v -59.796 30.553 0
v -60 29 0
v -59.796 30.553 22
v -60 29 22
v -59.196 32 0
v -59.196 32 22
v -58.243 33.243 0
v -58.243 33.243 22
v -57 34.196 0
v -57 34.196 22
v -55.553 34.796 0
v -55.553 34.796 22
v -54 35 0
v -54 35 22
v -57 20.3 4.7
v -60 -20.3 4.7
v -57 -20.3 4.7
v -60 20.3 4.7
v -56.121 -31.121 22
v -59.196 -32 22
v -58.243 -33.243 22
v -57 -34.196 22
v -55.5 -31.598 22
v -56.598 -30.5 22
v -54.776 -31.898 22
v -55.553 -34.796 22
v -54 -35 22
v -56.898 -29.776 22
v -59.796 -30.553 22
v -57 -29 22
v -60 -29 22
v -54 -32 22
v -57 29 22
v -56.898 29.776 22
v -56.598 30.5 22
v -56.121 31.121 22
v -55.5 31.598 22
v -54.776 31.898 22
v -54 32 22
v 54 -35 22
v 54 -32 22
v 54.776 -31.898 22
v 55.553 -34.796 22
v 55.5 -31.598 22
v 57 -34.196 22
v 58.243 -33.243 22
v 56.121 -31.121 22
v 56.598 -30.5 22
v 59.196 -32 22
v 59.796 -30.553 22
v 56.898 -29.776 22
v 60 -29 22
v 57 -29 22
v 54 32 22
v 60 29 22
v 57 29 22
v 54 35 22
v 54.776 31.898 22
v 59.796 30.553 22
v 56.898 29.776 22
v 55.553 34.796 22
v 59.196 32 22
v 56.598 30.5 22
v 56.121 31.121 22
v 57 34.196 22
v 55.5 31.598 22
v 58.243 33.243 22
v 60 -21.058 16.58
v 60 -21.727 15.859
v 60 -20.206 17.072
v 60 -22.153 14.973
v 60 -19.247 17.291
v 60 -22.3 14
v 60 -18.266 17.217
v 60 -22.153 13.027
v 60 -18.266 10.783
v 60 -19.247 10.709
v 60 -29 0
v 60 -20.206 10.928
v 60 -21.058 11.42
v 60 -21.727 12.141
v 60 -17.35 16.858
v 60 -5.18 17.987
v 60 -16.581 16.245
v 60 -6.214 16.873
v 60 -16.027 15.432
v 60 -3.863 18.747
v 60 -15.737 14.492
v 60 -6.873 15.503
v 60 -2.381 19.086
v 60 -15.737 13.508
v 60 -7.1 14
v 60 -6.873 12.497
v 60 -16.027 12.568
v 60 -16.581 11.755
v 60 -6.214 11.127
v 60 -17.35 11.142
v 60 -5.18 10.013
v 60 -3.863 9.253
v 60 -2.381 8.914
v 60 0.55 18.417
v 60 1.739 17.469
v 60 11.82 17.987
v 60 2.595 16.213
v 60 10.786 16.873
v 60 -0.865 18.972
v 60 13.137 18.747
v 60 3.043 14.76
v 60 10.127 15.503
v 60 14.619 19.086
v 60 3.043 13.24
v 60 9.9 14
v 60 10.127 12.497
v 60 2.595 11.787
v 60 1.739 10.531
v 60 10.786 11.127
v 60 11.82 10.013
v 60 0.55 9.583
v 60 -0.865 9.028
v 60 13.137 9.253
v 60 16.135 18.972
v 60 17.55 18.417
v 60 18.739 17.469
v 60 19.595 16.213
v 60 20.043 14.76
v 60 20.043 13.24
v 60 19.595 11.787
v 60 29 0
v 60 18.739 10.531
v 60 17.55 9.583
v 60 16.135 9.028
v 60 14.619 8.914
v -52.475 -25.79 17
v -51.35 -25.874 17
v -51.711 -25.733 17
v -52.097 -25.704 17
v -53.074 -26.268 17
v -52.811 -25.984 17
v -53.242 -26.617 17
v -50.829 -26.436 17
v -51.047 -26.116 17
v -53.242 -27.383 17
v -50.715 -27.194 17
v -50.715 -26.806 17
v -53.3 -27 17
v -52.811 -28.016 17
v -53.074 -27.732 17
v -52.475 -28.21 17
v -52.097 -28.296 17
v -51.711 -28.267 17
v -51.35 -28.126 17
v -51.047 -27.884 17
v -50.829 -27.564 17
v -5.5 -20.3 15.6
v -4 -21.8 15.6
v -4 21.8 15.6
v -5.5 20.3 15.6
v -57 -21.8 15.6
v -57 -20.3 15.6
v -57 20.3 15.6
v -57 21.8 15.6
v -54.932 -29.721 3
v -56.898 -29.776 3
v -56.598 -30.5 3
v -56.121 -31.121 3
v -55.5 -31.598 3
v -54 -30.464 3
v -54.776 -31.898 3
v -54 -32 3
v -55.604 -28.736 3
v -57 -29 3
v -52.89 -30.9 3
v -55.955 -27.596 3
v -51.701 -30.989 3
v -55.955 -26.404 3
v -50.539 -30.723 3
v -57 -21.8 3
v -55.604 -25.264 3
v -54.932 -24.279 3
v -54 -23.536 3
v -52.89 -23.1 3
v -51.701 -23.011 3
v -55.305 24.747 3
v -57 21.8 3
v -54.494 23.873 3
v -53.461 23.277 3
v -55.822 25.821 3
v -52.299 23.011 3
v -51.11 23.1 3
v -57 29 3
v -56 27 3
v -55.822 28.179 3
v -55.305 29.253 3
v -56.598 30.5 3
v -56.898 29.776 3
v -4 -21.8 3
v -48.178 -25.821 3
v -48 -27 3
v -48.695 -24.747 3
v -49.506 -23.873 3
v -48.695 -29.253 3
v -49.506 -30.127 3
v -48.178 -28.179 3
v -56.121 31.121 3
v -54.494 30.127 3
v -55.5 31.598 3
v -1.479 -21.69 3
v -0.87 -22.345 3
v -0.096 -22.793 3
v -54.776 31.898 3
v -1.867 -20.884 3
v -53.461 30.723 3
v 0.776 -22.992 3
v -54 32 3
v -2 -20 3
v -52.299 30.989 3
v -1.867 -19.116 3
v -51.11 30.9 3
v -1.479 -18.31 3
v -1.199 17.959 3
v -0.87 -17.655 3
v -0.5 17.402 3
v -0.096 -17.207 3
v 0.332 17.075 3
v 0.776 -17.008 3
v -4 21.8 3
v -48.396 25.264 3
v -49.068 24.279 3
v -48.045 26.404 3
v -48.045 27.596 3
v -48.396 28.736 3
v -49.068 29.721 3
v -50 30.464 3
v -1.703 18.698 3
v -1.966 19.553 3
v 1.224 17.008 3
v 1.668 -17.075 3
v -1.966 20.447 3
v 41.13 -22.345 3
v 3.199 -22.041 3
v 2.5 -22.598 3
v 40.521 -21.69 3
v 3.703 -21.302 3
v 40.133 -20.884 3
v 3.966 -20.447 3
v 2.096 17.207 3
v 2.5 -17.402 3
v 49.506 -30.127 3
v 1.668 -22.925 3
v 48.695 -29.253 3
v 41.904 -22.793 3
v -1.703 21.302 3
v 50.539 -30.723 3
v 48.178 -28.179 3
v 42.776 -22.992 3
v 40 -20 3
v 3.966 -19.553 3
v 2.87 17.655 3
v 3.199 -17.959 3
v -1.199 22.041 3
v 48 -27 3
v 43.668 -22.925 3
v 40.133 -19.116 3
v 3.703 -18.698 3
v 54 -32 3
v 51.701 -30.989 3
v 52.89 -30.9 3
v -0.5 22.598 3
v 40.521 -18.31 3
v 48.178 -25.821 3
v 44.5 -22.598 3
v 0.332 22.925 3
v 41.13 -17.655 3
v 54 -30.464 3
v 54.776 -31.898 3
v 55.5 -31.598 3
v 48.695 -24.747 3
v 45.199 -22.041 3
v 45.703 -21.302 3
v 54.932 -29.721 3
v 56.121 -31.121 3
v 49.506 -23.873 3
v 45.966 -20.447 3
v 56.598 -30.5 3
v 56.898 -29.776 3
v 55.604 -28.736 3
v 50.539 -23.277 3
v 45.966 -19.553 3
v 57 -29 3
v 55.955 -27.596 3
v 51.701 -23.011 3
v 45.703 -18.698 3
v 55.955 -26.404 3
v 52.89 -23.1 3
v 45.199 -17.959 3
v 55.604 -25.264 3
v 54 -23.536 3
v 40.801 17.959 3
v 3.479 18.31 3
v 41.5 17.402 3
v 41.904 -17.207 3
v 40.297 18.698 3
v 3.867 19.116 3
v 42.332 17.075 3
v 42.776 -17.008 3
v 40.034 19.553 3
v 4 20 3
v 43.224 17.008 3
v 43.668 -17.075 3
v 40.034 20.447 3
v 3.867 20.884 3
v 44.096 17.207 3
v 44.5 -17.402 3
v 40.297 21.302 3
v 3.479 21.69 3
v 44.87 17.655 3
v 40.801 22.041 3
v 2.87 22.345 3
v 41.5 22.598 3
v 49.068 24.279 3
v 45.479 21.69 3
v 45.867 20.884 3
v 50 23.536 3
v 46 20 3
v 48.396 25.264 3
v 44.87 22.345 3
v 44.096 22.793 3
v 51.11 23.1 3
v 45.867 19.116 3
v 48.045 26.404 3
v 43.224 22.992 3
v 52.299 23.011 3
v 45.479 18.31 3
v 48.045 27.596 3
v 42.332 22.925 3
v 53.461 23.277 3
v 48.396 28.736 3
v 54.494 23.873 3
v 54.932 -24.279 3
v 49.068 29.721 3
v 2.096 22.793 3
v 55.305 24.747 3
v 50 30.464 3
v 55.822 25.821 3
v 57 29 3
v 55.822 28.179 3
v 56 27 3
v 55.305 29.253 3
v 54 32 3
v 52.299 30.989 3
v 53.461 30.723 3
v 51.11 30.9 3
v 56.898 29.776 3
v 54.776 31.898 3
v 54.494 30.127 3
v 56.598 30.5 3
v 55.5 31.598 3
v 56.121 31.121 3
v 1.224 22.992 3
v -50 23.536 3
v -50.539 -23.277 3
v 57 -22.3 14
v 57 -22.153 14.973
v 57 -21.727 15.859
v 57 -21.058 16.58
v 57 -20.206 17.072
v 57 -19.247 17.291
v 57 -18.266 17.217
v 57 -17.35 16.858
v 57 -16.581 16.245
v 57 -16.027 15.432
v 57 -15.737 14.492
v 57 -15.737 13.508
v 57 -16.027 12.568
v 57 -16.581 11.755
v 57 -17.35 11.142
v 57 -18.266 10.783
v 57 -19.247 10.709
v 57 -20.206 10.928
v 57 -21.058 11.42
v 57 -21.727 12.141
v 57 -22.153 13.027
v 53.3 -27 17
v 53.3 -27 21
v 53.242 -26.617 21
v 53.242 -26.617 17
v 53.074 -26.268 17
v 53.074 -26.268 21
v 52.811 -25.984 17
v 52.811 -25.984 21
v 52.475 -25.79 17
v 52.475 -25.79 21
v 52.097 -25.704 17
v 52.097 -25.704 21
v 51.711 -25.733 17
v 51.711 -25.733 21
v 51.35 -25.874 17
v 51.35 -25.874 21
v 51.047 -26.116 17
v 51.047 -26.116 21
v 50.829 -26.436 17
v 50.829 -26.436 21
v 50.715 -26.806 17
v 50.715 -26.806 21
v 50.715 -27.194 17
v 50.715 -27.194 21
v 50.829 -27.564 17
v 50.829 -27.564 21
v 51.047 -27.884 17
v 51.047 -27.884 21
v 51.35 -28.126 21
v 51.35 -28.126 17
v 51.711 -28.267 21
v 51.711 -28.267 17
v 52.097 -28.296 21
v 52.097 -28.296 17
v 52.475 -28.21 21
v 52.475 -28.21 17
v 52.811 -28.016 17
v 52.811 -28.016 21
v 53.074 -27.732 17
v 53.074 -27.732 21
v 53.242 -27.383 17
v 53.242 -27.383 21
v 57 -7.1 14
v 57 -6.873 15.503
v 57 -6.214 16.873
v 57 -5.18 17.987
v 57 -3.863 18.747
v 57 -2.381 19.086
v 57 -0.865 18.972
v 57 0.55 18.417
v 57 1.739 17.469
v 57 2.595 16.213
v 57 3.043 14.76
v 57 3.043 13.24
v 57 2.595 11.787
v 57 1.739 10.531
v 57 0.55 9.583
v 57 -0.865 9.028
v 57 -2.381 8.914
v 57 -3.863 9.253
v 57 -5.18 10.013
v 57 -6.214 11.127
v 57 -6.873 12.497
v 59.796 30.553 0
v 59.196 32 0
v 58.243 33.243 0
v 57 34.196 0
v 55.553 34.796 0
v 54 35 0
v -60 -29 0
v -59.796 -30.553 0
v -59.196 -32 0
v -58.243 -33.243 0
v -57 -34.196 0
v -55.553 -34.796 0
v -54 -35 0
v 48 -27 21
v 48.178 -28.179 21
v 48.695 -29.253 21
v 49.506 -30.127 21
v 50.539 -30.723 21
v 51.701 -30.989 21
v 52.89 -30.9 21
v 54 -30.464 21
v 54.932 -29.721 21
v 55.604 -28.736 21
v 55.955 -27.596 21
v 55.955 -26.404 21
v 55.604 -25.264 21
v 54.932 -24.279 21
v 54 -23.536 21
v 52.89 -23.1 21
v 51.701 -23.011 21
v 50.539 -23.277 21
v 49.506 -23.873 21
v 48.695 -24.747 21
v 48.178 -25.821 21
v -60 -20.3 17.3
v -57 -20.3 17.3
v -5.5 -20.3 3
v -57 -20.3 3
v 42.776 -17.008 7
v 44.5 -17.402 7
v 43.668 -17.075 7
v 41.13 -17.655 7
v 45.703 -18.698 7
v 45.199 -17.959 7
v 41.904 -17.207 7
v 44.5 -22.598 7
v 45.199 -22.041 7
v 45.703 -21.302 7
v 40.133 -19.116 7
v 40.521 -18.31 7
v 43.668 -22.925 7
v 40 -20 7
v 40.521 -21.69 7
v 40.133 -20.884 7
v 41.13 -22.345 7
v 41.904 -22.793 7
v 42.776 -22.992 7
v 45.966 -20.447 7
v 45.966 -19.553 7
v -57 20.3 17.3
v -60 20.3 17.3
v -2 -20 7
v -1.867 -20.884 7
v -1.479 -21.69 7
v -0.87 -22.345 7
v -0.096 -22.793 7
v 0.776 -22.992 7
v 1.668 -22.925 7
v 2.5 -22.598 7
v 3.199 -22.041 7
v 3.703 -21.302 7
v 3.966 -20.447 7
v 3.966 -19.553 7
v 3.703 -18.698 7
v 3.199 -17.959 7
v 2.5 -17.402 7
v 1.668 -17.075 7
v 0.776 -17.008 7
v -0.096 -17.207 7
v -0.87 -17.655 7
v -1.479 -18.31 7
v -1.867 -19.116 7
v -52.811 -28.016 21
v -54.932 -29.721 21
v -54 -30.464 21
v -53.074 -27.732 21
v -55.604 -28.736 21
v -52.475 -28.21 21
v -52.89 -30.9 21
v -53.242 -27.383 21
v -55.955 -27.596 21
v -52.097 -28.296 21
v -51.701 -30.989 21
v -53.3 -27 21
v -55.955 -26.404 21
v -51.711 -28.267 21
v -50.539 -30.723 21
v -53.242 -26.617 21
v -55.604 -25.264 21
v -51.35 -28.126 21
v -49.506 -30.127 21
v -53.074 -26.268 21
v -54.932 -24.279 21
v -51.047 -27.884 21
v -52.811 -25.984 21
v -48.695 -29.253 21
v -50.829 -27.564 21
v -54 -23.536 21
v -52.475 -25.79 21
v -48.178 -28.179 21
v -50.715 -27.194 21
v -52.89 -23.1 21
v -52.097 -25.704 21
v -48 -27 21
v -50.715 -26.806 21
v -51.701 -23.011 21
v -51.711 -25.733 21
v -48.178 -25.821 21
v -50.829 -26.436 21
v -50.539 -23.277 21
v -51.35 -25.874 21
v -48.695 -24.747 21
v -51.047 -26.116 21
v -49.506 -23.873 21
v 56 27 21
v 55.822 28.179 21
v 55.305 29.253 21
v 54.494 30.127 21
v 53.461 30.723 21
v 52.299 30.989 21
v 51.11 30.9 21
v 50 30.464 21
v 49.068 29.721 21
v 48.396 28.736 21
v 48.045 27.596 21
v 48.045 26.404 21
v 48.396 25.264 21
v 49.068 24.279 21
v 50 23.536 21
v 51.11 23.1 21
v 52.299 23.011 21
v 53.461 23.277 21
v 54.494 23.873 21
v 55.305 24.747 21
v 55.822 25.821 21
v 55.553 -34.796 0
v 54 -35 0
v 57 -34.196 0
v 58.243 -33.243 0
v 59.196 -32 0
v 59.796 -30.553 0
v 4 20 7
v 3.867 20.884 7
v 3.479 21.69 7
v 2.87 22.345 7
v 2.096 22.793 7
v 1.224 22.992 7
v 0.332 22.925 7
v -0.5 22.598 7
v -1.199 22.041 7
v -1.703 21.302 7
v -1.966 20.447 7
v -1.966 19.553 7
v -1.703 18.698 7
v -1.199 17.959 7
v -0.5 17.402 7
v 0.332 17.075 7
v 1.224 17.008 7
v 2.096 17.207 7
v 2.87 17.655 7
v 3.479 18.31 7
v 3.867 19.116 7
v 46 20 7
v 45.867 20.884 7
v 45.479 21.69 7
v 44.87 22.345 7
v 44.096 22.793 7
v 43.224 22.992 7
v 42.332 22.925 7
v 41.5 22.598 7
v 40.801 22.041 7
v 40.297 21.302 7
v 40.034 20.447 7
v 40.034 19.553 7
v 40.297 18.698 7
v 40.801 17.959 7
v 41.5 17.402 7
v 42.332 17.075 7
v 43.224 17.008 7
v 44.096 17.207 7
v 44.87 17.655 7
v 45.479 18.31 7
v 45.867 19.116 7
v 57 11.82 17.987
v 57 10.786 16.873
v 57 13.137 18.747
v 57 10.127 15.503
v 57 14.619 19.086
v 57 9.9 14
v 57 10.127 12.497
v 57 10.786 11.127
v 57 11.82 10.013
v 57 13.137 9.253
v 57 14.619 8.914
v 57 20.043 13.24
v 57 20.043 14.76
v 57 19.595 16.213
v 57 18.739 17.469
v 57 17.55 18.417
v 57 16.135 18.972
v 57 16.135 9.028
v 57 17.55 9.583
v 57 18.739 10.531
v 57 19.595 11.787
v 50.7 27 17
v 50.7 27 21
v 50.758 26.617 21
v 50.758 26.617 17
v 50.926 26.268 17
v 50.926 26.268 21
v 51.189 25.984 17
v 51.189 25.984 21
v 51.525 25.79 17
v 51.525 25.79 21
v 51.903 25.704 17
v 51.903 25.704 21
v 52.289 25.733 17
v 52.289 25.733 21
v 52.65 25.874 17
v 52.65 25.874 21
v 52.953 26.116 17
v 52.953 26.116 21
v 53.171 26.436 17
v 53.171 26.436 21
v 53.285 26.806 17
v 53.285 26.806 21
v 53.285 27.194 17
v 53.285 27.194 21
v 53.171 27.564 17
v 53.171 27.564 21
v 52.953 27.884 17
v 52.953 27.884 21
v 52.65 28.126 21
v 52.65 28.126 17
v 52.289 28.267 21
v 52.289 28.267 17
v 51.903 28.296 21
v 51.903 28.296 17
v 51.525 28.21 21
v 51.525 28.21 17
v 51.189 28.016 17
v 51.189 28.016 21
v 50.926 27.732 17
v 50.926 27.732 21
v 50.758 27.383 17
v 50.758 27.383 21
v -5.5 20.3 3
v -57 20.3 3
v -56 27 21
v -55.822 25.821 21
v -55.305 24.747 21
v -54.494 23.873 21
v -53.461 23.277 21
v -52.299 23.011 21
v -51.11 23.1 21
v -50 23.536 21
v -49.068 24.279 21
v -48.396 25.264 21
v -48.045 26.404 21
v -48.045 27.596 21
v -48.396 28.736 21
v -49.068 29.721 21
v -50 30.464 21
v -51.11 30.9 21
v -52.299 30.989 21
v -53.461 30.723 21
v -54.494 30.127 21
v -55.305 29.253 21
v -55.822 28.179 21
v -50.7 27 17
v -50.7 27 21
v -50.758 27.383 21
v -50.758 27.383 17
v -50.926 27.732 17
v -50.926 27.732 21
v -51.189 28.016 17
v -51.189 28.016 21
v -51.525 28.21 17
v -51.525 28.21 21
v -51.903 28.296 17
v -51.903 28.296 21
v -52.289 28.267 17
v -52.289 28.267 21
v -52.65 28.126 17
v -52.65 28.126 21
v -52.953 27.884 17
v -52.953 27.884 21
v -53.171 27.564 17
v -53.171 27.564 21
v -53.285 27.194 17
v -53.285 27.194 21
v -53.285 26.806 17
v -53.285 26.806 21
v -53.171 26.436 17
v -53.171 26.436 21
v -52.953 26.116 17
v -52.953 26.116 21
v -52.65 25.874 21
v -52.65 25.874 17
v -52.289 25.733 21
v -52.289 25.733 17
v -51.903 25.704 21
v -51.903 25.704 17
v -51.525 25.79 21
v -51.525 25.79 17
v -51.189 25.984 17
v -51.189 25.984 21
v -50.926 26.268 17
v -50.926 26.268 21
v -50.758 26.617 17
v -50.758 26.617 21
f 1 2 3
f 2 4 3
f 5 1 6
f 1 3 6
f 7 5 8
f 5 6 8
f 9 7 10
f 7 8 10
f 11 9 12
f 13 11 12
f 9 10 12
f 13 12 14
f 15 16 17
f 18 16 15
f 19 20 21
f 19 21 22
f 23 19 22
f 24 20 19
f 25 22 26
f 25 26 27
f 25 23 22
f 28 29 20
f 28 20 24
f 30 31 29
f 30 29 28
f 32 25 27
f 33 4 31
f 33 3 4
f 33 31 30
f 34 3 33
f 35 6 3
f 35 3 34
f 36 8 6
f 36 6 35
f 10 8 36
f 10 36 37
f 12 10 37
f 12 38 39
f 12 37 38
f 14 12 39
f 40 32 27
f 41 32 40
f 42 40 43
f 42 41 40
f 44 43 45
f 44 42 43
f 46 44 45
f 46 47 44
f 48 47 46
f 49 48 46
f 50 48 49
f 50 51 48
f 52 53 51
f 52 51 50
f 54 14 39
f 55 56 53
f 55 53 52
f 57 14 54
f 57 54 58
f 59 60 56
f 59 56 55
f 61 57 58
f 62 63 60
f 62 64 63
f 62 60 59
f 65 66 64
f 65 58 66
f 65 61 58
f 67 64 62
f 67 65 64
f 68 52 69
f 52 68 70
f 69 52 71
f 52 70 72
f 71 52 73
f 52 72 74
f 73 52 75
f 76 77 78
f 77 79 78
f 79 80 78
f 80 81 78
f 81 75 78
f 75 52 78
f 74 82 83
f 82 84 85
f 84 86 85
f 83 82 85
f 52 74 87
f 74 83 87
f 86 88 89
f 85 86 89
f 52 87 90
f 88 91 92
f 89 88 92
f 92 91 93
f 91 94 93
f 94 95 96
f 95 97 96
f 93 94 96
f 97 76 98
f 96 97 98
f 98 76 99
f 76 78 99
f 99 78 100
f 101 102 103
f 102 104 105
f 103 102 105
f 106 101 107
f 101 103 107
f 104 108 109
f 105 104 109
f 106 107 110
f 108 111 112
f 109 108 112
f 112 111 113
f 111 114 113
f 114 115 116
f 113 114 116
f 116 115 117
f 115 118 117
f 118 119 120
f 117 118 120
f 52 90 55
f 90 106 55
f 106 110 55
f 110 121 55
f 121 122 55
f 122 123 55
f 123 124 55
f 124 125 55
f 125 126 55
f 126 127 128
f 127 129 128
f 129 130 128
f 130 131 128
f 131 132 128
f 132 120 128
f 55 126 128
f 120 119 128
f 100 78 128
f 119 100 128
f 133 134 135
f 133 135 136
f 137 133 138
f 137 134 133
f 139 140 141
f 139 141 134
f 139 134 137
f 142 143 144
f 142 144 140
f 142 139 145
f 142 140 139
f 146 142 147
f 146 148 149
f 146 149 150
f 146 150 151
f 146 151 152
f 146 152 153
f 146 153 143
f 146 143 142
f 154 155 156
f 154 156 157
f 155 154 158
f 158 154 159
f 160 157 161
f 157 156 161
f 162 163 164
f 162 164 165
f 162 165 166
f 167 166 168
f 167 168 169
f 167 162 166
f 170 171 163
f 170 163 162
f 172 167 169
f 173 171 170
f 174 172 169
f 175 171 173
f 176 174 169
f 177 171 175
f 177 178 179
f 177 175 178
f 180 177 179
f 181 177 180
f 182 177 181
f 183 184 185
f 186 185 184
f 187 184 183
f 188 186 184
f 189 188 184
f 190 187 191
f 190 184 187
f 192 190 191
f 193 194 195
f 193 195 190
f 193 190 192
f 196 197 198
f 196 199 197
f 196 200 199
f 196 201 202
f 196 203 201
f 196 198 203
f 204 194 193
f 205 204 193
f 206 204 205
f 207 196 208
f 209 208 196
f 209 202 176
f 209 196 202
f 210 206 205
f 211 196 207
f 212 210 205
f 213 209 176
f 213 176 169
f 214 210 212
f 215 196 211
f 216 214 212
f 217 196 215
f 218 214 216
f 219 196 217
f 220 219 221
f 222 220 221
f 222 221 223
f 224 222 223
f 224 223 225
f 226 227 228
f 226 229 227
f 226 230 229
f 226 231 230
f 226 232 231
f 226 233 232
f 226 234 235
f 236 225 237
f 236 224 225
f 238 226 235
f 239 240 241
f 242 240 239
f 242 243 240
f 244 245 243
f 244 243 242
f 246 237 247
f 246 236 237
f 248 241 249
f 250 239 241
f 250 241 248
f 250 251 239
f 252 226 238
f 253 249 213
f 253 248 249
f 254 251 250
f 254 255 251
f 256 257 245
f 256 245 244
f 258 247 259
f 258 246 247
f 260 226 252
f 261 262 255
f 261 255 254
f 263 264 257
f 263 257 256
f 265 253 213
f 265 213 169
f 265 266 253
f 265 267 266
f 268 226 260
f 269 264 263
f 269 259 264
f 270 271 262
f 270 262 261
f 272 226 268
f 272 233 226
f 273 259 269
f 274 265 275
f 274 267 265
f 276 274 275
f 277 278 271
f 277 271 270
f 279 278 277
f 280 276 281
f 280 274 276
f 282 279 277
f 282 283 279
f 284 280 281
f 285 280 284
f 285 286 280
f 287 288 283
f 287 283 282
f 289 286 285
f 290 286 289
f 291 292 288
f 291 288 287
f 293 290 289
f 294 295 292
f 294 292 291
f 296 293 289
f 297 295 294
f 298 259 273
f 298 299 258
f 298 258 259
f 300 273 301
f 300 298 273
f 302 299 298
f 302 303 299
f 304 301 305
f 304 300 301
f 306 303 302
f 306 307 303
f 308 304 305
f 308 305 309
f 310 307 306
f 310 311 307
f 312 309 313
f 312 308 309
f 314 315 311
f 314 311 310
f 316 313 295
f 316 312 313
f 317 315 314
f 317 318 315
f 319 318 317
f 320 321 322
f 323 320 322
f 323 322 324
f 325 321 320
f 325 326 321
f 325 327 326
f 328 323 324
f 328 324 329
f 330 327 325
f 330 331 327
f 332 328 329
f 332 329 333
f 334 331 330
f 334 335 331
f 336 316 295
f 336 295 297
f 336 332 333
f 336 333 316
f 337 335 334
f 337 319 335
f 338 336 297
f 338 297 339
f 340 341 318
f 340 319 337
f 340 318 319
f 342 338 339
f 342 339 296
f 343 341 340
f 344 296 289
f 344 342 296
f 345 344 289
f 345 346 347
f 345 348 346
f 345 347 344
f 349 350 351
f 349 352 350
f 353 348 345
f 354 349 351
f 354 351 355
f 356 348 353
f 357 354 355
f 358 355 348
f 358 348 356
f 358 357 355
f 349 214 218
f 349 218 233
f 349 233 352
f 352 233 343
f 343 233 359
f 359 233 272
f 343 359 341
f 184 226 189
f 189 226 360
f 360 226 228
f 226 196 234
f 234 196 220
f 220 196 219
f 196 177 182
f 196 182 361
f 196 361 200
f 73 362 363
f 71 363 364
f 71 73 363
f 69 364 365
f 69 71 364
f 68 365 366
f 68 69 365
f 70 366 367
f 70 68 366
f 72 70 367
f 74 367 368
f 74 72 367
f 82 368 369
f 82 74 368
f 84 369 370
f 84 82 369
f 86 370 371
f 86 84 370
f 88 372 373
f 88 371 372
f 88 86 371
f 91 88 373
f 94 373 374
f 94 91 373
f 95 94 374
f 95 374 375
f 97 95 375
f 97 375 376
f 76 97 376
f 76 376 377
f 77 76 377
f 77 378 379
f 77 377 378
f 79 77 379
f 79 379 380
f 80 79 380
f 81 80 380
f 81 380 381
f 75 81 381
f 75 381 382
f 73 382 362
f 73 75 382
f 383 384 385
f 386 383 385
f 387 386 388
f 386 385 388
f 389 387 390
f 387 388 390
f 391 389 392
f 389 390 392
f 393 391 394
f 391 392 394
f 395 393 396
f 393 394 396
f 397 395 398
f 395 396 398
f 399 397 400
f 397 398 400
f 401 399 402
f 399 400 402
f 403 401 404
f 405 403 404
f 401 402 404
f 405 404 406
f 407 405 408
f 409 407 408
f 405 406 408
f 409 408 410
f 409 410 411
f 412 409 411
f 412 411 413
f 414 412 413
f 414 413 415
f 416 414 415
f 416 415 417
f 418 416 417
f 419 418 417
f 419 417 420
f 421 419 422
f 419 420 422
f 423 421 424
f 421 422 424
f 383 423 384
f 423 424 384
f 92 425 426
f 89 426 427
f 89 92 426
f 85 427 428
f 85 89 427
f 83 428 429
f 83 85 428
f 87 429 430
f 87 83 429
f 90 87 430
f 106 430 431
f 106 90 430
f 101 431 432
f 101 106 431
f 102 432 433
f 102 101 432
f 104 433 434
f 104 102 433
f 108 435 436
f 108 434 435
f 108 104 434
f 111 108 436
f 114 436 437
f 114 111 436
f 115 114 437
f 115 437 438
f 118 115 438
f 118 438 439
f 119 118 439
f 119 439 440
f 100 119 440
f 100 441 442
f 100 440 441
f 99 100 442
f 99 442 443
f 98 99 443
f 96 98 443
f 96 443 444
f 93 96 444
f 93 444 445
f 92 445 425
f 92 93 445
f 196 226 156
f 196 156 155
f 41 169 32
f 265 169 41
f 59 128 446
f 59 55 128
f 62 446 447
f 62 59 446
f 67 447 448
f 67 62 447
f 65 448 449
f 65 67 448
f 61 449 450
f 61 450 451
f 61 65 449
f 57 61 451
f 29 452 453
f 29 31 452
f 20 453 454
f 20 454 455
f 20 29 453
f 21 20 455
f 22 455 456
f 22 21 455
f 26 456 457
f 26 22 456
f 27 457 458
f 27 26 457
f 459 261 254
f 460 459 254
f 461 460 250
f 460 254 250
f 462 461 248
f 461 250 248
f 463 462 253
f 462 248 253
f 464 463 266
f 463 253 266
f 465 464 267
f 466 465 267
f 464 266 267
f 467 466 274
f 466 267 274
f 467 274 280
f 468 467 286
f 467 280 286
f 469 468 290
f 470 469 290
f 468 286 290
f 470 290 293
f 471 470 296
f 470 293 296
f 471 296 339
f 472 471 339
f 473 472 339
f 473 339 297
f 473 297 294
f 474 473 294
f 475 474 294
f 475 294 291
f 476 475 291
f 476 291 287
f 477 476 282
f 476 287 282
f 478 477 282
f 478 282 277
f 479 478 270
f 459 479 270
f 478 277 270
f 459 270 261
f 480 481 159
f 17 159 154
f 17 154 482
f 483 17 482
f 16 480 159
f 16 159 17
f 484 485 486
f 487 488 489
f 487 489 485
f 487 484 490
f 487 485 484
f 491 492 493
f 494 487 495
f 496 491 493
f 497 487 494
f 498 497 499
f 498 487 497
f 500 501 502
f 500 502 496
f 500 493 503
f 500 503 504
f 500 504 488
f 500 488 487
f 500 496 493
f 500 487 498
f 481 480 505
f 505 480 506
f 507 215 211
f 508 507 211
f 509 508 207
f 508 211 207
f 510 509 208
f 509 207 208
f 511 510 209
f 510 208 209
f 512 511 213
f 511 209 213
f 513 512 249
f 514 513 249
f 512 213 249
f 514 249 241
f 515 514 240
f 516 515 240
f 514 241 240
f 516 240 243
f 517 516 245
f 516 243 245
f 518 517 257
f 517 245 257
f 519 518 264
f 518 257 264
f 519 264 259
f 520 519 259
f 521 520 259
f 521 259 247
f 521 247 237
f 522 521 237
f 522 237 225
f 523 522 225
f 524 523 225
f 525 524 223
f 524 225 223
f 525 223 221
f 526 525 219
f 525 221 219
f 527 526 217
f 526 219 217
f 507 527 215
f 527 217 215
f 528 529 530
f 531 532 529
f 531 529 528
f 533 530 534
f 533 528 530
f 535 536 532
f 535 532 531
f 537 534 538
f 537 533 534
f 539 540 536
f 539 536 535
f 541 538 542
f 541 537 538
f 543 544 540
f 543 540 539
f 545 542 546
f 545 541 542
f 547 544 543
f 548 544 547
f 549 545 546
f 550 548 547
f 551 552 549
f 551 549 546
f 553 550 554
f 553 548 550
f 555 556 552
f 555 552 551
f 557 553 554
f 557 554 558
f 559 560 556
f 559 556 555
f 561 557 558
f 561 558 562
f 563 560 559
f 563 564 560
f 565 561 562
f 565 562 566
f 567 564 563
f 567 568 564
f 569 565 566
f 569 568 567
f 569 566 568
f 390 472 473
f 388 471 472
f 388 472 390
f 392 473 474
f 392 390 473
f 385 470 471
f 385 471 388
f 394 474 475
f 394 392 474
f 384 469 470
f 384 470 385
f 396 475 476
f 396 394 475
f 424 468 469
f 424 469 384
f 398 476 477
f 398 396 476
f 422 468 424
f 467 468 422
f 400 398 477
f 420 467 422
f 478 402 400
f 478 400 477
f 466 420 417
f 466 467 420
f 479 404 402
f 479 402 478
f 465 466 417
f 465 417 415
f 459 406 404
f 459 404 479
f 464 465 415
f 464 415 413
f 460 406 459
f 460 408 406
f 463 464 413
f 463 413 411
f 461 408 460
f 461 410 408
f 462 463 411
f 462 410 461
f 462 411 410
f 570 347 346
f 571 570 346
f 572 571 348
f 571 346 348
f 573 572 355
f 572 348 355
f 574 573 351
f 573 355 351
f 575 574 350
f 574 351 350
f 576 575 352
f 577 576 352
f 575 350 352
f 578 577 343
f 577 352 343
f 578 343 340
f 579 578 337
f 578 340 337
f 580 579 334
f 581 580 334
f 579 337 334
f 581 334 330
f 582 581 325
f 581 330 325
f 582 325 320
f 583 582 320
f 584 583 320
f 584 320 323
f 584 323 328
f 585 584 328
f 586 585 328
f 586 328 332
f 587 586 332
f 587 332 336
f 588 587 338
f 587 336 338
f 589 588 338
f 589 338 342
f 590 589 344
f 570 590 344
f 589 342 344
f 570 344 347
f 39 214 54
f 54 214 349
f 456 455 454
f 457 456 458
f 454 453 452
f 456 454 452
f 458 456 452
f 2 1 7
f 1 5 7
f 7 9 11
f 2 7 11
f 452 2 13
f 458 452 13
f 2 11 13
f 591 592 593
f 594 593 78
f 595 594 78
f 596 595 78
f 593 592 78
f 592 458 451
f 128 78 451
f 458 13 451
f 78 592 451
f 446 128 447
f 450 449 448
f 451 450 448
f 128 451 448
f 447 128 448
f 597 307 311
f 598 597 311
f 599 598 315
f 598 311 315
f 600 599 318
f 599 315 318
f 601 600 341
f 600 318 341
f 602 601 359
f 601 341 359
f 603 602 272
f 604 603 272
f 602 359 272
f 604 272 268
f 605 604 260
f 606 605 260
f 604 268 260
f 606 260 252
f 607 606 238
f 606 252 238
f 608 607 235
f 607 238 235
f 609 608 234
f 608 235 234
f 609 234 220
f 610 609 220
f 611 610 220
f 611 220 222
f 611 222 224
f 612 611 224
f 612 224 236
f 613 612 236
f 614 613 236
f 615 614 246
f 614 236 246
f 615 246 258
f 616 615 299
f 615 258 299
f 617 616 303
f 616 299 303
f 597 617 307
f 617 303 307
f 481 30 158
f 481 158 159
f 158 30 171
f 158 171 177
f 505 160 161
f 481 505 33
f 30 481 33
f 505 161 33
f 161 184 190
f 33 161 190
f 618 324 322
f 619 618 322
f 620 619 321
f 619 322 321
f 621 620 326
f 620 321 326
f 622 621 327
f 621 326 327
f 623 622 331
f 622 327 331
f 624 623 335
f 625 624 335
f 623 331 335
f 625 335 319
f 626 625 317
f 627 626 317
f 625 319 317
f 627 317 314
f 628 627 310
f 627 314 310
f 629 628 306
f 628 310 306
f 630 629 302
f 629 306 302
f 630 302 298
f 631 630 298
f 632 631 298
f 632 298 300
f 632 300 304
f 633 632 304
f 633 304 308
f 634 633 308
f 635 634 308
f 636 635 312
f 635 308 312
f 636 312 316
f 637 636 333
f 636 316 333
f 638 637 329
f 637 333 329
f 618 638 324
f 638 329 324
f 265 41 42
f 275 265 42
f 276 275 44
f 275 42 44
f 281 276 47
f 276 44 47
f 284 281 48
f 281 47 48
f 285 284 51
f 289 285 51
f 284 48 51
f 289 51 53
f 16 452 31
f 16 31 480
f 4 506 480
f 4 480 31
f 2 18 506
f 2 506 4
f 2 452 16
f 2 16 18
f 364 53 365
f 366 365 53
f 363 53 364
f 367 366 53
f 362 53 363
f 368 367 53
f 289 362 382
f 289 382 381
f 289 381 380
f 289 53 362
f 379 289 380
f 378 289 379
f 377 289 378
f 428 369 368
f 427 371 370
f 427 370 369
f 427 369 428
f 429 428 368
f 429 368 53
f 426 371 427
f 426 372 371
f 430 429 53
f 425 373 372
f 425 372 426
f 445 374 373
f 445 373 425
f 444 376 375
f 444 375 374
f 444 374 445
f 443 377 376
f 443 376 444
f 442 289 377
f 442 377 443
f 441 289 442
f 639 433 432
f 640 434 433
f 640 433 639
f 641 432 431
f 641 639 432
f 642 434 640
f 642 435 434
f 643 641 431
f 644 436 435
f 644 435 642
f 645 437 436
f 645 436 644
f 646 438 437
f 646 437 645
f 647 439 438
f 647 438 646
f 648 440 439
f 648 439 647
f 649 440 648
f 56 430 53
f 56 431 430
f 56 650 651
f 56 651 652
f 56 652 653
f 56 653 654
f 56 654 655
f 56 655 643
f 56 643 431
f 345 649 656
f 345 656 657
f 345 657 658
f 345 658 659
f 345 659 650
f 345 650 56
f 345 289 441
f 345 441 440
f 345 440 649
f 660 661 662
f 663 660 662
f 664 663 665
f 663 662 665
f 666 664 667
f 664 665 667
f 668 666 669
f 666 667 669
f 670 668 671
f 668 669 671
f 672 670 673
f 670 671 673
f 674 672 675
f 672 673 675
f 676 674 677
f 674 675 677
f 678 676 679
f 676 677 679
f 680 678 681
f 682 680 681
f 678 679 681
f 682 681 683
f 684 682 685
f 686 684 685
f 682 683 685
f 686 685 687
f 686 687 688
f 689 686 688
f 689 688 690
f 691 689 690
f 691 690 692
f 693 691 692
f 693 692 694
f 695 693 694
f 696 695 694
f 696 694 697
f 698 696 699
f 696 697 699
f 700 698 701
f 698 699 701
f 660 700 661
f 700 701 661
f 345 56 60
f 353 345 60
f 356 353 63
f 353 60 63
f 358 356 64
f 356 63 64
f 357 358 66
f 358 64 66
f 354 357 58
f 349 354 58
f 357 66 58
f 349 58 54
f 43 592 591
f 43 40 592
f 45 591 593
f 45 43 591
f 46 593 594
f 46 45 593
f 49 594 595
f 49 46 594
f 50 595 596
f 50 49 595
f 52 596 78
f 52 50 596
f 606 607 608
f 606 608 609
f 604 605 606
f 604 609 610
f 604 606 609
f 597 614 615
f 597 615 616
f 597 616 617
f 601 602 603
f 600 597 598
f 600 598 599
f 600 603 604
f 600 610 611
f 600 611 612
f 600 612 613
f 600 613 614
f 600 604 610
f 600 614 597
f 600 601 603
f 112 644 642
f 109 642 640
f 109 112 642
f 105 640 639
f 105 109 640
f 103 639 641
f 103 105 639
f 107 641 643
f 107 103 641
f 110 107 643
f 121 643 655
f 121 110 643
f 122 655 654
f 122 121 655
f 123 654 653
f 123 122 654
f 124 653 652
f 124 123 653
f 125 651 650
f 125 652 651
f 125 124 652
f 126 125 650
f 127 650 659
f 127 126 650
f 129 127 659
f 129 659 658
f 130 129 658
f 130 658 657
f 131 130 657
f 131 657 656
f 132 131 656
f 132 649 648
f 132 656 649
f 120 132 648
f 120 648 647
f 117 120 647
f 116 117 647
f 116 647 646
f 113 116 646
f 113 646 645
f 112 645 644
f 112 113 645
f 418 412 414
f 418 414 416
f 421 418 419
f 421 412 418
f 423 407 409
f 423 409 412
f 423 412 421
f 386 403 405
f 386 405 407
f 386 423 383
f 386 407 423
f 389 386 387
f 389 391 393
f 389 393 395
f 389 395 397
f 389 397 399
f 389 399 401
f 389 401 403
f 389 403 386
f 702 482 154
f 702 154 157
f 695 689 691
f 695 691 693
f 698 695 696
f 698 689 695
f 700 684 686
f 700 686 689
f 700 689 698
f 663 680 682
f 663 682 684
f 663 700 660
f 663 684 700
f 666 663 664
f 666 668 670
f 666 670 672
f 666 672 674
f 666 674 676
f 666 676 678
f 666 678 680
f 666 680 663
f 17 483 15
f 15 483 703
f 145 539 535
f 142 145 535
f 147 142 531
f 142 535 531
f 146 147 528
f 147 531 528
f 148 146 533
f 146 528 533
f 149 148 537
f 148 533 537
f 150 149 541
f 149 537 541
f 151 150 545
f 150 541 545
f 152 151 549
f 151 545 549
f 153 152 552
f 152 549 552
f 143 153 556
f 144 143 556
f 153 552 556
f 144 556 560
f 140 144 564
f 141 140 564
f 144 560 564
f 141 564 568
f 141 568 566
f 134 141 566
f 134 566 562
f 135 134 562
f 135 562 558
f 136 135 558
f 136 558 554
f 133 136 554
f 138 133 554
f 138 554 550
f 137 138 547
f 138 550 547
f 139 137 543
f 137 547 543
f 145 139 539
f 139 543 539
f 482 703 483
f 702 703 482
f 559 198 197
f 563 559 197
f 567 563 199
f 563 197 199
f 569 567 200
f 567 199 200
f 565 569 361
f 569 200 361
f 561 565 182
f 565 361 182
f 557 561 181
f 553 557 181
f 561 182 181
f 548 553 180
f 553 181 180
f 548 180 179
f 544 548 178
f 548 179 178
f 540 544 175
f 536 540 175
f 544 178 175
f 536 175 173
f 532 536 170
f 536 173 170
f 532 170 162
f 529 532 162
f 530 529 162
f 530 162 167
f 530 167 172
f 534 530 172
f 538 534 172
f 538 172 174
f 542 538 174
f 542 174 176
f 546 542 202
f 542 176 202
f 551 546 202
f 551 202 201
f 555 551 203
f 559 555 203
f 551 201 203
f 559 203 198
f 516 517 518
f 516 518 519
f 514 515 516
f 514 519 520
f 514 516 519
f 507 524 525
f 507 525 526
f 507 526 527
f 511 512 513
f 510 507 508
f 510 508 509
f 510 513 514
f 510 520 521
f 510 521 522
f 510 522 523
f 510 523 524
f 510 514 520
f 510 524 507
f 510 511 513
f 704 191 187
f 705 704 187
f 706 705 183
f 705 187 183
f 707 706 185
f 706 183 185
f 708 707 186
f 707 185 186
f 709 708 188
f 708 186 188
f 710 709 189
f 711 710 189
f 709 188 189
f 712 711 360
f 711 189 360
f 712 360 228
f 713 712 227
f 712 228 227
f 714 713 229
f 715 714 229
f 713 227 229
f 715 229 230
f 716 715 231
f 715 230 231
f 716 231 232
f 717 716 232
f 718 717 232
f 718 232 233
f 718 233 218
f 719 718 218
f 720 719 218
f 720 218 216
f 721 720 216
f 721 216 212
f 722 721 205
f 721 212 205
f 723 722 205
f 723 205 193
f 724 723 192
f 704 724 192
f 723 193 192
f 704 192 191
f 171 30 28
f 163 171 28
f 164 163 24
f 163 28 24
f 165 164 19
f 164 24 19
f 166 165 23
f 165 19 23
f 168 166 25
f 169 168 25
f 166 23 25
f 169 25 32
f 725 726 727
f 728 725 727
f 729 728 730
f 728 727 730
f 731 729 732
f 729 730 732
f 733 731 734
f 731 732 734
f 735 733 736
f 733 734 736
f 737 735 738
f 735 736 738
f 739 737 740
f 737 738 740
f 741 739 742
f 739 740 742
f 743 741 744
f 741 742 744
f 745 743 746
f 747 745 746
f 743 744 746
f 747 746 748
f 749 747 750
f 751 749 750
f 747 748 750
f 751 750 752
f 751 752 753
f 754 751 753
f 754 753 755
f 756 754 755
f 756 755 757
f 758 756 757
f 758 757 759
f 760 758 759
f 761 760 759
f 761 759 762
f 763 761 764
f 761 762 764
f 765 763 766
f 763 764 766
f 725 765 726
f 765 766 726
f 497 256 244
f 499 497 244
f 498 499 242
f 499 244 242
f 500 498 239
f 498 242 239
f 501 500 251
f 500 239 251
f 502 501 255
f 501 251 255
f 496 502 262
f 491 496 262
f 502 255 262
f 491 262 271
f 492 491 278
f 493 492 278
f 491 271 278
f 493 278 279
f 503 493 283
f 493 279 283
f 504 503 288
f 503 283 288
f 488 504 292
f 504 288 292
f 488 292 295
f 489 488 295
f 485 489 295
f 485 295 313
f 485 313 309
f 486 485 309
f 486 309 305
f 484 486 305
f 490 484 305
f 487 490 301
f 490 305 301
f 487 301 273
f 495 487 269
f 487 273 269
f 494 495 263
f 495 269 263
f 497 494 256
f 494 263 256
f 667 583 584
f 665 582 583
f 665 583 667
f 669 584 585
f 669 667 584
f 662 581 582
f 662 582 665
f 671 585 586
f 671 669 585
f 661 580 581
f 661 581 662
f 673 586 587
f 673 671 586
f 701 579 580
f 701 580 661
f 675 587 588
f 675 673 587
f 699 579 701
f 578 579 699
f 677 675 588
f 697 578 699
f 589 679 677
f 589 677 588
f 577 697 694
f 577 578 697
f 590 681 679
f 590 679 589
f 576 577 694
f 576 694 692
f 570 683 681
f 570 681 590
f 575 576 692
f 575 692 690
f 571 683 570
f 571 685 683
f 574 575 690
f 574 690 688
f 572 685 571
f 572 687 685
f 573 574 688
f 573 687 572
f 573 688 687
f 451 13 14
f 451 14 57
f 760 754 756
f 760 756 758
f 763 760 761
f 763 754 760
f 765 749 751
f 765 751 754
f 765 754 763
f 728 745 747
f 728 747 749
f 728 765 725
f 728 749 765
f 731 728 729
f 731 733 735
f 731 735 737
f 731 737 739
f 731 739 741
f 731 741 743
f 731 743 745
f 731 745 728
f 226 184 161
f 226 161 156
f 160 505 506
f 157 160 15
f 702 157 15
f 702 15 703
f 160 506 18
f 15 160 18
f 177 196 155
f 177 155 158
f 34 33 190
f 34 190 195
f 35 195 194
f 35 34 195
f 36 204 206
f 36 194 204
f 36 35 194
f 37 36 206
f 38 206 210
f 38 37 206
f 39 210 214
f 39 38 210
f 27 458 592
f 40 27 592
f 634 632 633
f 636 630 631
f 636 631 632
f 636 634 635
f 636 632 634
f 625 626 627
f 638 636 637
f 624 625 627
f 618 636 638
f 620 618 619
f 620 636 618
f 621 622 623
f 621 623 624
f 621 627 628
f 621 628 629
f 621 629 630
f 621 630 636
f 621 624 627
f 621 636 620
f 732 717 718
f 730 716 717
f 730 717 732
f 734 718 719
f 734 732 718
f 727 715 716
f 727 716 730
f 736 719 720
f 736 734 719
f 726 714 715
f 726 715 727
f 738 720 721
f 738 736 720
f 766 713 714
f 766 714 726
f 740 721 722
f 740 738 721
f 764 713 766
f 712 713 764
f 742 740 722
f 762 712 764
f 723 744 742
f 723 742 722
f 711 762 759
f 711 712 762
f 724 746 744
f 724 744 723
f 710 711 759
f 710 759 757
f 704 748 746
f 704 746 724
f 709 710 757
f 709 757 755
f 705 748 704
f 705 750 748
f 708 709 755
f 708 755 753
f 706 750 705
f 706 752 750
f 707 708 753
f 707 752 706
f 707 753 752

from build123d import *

# Parameters (mm, degrees)
SKETCH1_W           = 120
SKETCH1_H           = 70
BOSS_EXTRUDE1_DEPTH = 22
FILLET1_R           = 6
SHELL1_T            = -3
SKETCH2_R           = 4
BOSS_EXTRUDE2_DEPTH = 18.0000001
SKETCH4_R           = 1.3
CUT_EXTRUDE1_DEPTH  = 4
BOSS_EXTRUDE3_DEPTH = 12.6
CUT_EXTRUDE2_REACH  = 128.921
SKETCH6_W           = 12.6
SKETCH6_H           = 40.6
CUT_EXTRUDE3_REACH  = 128.921
SKETCH8_R           = 5.1
SKETCH8_R_2         = 3.3
SKETCH9_R           = 3
BOSS_EXTRUDE4_DEPTH = 4


with BuildPart() as part:
    # Sketch1 → Boss-Extrude1 (new body)
    with BuildSketch(Plane.XY):
        Rectangle(SKETCH1_W, SKETCH1_H)
    extrude(amount=BOSS_EXTRUDE1_DEPTH)

    # Fillet1
    fillet1_edges = [part.edges().sort_by_distance(p)[0] for p in [
        (-60, 35, 11),
        (60, 35, 11),
        (60, -35, 11),
        (-60, -35, 11),
    ]]
    fillet(fillet1_edges, radius=FILLET1_R)

    # Shell1
    shell1_openings = [part.faces().sort_by_distance(p)[0] for p in [
        (0, 0, 22),
    ]]
    offset(amount=SHELL1_T, openings=shell1_openings, kind=Kind.INTERSECTION)

    # Sketch2 → Boss-Extrude2 (add)
    with BuildSketch(Plane.XY.offset(3)):
        with Locations((-52, -27)):
            Circle(SKETCH2_R)
        with Locations(Location((52, -27, 0), (0, 0, 180))):
            Circle(SKETCH2_R)
        with Locations((52, 27)):
            Circle(SKETCH2_R)
        with Locations(Location((-52, 27, 0), (0, 0, 180))):
            Circle(SKETCH2_R)
    extrude(amount=BOSS_EXTRUDE2_DEPTH)

    # Sketch4 → Cut-Extrude1 (cut)
    with BuildSketch(Plane.XY.offset(21.0000001)):
        with Locations((-52, 27)):
            Circle(SKETCH4_R)
        with Locations(Location((-52, -27, 0), (0, 0, 180))):
            Circle(SKETCH4_R)
        with Locations((52, -27)):
            Circle(SKETCH4_R)
        with Locations(Location((52, 27, 0), (0, 0, 180))):
            Circle(SKETCH4_R)
    extrude(amount=-CUT_EXTRUDE1_DEPTH, mode=Mode.SUBTRACT)

    # Sketch5 → Boss-Extrude3 (add)
    with BuildSketch(Plane(origin=(0, 0, 3), x_dir=(-1, 0, 0), z_dir=(0, 0, -1))):
        Polygon((57, 21.8), (4, 21.8), (4, -21.8), (57, -21.8), (57, -20.3), (5.5, -20.3), (5.5, 20.3), (57, 20.3), align=None)
    extrude(amount=-BOSS_EXTRUDE3_DEPTH)

    # Sketch6 → Cut-Extrude2 (cut, up to next)
    with BuildSketch(Plane(origin=(-60, 0, 0), x_dir=(0, 0, -1), z_dir=(1, 0, 0)), mode=Mode.PRIVATE) as cut_extrude2_sk1:
        with Locations((-11, 0)):
            Rectangle(SKETCH6_W, SKETCH6_H)
    cut_extrude2_tool1 = extrude(cut_extrude2_sk1.sketch, amount=CUT_EXTRUDE2_REACH, mode=Mode.PRIVATE) & part.part
    add(cut_extrude2_tool1.solids().sort_by_distance((-60, 0, 11))[0], mode=Mode.SUBTRACT)

    # Sketch8 → Cut-Extrude3 (cut, up to next)
    with BuildSketch(Plane.ZY.offset(-60), mode=Mode.PRIVATE) as cut_extrude3_sk1:
        with Locations(Location((14, 15, 0), (0, 0, 270))):
            Circle(SKETCH8_R)
    cut_extrude3_tool1 = extrude(cut_extrude3_sk1.sketch, amount=CUT_EXTRUDE3_REACH, mode=Mode.PRIVATE) & part.part
    # Sketch8 → Cut-Extrude3 (cut, up to next)
    with BuildSketch(Plane.ZY.offset(-60), mode=Mode.PRIVATE) as cut_extrude3_sk2:
        with Locations(Location((14, -2, 0), (0, 0, 270))):
            Circle(SKETCH8_R)
    cut_extrude3_tool2 = extrude(cut_extrude3_sk2.sketch, amount=CUT_EXTRUDE3_REACH, mode=Mode.PRIVATE) & part.part
    # Sketch8 → Cut-Extrude3 (cut, up to next)
    with BuildSketch(Plane.ZY.offset(-60), mode=Mode.PRIVATE) as cut_extrude3_sk3:
        with Locations(Location((14, -19, 0), (0, 0, 270))):
            Circle(SKETCH8_R_2)
    cut_extrude3_tool3 = extrude(cut_extrude3_sk3.sketch, amount=CUT_EXTRUDE3_REACH, mode=Mode.PRIVATE) & part.part
    add(cut_extrude3_tool1.solids().sort_by_distance((60, 15, 14))[0], mode=Mode.SUBTRACT)
    add(cut_extrude3_tool2.solids().sort_by_distance((60, -2, 14))[0], mode=Mode.SUBTRACT)
    add(cut_extrude3_tool3.solids().sort_by_distance((60, -19, 14))[0], mode=Mode.SUBTRACT)

    # Sketch9 → Boss-Extrude4 (add)
    with BuildSketch(Plane.XY.offset(3)):
        with Locations((43, 20)):
            Circle(SKETCH9_R)
        with Locations((1, 20)):
            Circle(SKETCH9_R)
        with Locations(Location((1, -20, 0), (0, 0, 180))):
            Circle(SKETCH9_R)
        with Locations(Location((43, -20, 0), (0, 0, 180))):
            Circle(SKETCH9_R)
    extrude(amount=BOSS_EXTRUDE4_DEPTH)


solid = part.part
